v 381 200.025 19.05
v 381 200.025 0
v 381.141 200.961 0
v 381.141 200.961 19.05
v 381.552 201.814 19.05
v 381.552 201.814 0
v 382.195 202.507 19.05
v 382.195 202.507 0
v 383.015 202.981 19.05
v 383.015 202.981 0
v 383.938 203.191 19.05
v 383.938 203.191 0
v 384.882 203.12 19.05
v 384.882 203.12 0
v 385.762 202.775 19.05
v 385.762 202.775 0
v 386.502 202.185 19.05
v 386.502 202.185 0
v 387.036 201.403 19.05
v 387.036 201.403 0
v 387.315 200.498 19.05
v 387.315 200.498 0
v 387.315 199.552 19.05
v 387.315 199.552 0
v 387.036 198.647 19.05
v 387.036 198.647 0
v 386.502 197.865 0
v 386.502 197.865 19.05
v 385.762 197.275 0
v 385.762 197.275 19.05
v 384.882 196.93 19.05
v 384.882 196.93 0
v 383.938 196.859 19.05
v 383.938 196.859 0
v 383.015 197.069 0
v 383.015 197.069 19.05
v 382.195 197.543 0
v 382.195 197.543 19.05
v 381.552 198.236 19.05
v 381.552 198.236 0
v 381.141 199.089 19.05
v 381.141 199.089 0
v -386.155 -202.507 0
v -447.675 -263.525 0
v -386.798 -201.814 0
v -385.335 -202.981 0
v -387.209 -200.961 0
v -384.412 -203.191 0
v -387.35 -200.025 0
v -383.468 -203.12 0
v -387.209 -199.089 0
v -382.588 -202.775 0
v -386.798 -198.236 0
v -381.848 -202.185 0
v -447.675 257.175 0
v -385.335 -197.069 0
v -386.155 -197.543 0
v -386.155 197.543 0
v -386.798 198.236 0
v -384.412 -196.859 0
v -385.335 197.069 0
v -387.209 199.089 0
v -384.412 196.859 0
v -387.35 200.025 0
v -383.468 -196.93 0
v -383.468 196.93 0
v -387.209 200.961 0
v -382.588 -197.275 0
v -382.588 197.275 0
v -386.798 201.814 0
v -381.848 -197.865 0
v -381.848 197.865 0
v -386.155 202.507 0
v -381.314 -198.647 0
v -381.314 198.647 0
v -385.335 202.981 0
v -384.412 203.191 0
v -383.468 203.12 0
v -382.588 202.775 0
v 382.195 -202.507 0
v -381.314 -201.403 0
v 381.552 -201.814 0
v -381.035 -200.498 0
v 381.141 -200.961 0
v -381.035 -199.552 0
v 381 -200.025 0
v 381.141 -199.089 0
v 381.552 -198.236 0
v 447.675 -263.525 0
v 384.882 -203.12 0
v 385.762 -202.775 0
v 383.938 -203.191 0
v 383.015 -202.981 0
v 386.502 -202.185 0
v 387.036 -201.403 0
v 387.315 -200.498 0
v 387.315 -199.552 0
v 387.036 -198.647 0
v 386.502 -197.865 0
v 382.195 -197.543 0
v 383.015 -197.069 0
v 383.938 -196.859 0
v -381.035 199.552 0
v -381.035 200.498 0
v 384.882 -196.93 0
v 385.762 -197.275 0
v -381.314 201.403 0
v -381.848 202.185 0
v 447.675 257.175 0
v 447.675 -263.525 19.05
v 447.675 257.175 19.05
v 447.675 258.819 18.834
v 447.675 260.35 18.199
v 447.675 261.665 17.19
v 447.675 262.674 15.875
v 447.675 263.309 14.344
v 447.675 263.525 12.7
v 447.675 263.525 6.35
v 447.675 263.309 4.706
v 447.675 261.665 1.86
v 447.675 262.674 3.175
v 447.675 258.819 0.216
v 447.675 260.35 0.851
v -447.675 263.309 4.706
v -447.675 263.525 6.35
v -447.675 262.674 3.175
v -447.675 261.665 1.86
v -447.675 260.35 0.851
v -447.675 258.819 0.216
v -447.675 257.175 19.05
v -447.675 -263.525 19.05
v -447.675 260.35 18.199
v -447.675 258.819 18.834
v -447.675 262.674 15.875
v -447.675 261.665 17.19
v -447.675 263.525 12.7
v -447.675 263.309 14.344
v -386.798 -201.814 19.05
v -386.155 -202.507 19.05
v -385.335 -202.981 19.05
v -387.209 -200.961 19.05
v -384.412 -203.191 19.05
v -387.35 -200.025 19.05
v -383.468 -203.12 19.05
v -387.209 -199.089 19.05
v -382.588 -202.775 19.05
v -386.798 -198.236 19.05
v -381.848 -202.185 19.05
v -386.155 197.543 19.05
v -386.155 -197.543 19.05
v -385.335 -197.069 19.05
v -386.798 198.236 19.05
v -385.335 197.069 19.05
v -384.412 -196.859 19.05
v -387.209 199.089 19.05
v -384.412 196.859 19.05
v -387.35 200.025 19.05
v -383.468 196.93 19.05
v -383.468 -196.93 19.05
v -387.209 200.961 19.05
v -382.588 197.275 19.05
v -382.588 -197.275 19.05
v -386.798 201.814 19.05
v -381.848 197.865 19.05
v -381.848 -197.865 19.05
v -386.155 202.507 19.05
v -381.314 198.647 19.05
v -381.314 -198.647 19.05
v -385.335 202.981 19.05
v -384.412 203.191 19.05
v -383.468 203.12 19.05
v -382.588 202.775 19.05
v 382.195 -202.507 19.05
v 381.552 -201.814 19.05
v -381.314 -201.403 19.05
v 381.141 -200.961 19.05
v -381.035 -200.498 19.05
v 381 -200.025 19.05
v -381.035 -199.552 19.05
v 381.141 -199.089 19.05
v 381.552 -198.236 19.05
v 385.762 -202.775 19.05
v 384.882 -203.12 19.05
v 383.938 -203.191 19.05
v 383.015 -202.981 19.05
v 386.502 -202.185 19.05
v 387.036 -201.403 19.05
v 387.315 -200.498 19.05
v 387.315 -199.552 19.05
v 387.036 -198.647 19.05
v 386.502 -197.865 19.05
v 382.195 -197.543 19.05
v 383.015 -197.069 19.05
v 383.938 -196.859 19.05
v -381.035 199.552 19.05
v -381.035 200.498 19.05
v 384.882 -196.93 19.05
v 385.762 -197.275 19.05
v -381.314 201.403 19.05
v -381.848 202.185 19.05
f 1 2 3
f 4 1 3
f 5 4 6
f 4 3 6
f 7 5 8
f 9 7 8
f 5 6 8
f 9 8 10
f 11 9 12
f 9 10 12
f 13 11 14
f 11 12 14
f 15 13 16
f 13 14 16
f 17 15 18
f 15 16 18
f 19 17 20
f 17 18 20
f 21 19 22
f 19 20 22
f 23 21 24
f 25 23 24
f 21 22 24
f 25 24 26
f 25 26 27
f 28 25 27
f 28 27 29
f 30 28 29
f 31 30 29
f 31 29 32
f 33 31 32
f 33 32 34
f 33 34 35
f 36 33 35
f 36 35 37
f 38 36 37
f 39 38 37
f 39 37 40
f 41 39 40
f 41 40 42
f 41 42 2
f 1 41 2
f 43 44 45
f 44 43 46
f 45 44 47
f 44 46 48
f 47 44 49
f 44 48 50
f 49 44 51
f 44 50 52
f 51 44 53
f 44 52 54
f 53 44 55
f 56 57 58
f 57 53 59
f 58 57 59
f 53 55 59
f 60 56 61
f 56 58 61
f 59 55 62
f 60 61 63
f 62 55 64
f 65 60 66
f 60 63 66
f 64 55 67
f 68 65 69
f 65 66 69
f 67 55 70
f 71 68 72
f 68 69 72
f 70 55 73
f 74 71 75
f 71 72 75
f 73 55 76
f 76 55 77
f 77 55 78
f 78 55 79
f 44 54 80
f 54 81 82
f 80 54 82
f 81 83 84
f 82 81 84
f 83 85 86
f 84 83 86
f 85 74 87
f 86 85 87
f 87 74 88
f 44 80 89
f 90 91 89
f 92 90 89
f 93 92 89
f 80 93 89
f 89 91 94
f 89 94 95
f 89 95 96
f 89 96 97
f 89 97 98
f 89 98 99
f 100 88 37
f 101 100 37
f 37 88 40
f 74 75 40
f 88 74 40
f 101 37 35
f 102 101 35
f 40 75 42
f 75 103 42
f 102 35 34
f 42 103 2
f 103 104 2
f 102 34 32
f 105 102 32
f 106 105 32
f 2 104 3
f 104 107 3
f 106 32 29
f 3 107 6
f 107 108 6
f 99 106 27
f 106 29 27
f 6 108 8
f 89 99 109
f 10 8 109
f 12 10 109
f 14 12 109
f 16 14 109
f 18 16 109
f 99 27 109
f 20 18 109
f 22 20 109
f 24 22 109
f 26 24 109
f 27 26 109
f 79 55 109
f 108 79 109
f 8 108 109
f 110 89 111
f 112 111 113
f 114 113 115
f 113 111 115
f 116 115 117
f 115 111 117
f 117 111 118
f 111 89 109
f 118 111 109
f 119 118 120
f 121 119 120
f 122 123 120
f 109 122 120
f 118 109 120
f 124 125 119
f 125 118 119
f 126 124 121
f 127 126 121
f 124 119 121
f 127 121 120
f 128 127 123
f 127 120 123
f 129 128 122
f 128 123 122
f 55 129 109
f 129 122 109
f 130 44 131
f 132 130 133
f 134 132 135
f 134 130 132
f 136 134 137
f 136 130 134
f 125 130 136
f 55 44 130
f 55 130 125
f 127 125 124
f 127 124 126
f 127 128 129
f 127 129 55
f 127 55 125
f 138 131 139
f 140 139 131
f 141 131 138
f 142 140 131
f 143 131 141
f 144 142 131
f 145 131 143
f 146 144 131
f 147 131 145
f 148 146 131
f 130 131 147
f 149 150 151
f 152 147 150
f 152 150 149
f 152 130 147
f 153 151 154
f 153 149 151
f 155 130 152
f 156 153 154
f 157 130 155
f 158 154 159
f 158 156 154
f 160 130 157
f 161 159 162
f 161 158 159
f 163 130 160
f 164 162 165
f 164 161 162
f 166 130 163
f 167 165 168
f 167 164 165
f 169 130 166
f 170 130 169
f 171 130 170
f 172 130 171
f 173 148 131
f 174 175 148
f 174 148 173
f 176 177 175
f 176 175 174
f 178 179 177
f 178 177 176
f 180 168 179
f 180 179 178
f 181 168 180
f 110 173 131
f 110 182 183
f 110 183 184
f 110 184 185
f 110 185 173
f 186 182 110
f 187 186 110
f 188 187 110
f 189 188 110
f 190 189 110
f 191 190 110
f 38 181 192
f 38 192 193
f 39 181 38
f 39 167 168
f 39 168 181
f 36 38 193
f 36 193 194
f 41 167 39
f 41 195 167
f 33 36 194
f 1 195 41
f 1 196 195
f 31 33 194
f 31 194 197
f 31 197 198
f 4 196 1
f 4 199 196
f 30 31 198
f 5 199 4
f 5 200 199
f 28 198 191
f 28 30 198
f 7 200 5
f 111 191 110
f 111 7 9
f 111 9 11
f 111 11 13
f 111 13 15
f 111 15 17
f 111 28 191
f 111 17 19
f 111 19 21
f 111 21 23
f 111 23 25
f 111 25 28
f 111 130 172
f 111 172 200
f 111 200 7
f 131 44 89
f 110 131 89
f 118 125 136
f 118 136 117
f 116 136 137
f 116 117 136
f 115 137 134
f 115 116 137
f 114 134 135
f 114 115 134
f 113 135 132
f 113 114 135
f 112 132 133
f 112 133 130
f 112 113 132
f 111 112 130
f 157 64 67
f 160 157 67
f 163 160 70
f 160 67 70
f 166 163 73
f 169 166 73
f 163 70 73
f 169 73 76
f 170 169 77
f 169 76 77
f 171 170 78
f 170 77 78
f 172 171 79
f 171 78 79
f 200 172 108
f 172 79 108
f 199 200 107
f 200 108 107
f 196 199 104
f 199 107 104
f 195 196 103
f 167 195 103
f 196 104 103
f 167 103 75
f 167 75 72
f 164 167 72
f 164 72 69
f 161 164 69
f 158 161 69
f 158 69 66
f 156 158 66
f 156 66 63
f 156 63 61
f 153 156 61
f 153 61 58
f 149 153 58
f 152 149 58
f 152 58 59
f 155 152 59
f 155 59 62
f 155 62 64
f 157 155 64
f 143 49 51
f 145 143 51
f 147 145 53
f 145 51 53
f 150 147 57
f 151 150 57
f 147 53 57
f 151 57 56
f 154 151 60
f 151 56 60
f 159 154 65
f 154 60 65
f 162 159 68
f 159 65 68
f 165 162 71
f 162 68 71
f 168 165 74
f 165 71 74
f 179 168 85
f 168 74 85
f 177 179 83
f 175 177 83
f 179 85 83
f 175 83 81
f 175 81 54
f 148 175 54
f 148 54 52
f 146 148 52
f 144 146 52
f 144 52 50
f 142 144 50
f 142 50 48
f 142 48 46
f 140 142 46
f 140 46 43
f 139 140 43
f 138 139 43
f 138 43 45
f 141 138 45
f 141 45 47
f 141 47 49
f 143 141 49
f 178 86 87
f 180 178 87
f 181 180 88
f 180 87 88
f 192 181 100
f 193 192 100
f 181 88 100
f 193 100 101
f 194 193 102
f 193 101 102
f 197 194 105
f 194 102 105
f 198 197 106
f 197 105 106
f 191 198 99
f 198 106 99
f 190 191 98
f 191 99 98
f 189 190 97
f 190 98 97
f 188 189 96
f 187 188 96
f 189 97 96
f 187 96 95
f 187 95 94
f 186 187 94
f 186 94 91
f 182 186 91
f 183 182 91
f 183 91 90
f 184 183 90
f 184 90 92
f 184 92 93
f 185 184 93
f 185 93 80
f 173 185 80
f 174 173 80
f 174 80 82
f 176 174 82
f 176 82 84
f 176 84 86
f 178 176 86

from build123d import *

# Parameters (mm, degrees)
F0_W     = 895.35
F0_H     = 527.05
F1_DEPTH = 19.05
F2_R     = 6.35
F4_D     = 6.35


with BuildPart() as f1:
    # F0 (on Top) → F1 (new body)
    with BuildSketch(Plane.XY):
        Rectangle(F0_W, F0_H)
    extrude(amount=F1_DEPTH)

    # F2
    f2_edges = [f1.edges().sort_by_distance(p)[0] for p in [
        (0, 263.525, 19.05),
        (0, 263.525, 0),
    ]]
    fillet(f2_edges, radius=F2_R)

    # F4 (through all)
    with Locations(Plane.XY.offset(19.05)):
        with Locations((-384.175, -200.025), (-384.175, 200.025), (384.175, 200.025), (384.175, -200.025)):
            Hole(F4_D / 2)


solid = f1.part
